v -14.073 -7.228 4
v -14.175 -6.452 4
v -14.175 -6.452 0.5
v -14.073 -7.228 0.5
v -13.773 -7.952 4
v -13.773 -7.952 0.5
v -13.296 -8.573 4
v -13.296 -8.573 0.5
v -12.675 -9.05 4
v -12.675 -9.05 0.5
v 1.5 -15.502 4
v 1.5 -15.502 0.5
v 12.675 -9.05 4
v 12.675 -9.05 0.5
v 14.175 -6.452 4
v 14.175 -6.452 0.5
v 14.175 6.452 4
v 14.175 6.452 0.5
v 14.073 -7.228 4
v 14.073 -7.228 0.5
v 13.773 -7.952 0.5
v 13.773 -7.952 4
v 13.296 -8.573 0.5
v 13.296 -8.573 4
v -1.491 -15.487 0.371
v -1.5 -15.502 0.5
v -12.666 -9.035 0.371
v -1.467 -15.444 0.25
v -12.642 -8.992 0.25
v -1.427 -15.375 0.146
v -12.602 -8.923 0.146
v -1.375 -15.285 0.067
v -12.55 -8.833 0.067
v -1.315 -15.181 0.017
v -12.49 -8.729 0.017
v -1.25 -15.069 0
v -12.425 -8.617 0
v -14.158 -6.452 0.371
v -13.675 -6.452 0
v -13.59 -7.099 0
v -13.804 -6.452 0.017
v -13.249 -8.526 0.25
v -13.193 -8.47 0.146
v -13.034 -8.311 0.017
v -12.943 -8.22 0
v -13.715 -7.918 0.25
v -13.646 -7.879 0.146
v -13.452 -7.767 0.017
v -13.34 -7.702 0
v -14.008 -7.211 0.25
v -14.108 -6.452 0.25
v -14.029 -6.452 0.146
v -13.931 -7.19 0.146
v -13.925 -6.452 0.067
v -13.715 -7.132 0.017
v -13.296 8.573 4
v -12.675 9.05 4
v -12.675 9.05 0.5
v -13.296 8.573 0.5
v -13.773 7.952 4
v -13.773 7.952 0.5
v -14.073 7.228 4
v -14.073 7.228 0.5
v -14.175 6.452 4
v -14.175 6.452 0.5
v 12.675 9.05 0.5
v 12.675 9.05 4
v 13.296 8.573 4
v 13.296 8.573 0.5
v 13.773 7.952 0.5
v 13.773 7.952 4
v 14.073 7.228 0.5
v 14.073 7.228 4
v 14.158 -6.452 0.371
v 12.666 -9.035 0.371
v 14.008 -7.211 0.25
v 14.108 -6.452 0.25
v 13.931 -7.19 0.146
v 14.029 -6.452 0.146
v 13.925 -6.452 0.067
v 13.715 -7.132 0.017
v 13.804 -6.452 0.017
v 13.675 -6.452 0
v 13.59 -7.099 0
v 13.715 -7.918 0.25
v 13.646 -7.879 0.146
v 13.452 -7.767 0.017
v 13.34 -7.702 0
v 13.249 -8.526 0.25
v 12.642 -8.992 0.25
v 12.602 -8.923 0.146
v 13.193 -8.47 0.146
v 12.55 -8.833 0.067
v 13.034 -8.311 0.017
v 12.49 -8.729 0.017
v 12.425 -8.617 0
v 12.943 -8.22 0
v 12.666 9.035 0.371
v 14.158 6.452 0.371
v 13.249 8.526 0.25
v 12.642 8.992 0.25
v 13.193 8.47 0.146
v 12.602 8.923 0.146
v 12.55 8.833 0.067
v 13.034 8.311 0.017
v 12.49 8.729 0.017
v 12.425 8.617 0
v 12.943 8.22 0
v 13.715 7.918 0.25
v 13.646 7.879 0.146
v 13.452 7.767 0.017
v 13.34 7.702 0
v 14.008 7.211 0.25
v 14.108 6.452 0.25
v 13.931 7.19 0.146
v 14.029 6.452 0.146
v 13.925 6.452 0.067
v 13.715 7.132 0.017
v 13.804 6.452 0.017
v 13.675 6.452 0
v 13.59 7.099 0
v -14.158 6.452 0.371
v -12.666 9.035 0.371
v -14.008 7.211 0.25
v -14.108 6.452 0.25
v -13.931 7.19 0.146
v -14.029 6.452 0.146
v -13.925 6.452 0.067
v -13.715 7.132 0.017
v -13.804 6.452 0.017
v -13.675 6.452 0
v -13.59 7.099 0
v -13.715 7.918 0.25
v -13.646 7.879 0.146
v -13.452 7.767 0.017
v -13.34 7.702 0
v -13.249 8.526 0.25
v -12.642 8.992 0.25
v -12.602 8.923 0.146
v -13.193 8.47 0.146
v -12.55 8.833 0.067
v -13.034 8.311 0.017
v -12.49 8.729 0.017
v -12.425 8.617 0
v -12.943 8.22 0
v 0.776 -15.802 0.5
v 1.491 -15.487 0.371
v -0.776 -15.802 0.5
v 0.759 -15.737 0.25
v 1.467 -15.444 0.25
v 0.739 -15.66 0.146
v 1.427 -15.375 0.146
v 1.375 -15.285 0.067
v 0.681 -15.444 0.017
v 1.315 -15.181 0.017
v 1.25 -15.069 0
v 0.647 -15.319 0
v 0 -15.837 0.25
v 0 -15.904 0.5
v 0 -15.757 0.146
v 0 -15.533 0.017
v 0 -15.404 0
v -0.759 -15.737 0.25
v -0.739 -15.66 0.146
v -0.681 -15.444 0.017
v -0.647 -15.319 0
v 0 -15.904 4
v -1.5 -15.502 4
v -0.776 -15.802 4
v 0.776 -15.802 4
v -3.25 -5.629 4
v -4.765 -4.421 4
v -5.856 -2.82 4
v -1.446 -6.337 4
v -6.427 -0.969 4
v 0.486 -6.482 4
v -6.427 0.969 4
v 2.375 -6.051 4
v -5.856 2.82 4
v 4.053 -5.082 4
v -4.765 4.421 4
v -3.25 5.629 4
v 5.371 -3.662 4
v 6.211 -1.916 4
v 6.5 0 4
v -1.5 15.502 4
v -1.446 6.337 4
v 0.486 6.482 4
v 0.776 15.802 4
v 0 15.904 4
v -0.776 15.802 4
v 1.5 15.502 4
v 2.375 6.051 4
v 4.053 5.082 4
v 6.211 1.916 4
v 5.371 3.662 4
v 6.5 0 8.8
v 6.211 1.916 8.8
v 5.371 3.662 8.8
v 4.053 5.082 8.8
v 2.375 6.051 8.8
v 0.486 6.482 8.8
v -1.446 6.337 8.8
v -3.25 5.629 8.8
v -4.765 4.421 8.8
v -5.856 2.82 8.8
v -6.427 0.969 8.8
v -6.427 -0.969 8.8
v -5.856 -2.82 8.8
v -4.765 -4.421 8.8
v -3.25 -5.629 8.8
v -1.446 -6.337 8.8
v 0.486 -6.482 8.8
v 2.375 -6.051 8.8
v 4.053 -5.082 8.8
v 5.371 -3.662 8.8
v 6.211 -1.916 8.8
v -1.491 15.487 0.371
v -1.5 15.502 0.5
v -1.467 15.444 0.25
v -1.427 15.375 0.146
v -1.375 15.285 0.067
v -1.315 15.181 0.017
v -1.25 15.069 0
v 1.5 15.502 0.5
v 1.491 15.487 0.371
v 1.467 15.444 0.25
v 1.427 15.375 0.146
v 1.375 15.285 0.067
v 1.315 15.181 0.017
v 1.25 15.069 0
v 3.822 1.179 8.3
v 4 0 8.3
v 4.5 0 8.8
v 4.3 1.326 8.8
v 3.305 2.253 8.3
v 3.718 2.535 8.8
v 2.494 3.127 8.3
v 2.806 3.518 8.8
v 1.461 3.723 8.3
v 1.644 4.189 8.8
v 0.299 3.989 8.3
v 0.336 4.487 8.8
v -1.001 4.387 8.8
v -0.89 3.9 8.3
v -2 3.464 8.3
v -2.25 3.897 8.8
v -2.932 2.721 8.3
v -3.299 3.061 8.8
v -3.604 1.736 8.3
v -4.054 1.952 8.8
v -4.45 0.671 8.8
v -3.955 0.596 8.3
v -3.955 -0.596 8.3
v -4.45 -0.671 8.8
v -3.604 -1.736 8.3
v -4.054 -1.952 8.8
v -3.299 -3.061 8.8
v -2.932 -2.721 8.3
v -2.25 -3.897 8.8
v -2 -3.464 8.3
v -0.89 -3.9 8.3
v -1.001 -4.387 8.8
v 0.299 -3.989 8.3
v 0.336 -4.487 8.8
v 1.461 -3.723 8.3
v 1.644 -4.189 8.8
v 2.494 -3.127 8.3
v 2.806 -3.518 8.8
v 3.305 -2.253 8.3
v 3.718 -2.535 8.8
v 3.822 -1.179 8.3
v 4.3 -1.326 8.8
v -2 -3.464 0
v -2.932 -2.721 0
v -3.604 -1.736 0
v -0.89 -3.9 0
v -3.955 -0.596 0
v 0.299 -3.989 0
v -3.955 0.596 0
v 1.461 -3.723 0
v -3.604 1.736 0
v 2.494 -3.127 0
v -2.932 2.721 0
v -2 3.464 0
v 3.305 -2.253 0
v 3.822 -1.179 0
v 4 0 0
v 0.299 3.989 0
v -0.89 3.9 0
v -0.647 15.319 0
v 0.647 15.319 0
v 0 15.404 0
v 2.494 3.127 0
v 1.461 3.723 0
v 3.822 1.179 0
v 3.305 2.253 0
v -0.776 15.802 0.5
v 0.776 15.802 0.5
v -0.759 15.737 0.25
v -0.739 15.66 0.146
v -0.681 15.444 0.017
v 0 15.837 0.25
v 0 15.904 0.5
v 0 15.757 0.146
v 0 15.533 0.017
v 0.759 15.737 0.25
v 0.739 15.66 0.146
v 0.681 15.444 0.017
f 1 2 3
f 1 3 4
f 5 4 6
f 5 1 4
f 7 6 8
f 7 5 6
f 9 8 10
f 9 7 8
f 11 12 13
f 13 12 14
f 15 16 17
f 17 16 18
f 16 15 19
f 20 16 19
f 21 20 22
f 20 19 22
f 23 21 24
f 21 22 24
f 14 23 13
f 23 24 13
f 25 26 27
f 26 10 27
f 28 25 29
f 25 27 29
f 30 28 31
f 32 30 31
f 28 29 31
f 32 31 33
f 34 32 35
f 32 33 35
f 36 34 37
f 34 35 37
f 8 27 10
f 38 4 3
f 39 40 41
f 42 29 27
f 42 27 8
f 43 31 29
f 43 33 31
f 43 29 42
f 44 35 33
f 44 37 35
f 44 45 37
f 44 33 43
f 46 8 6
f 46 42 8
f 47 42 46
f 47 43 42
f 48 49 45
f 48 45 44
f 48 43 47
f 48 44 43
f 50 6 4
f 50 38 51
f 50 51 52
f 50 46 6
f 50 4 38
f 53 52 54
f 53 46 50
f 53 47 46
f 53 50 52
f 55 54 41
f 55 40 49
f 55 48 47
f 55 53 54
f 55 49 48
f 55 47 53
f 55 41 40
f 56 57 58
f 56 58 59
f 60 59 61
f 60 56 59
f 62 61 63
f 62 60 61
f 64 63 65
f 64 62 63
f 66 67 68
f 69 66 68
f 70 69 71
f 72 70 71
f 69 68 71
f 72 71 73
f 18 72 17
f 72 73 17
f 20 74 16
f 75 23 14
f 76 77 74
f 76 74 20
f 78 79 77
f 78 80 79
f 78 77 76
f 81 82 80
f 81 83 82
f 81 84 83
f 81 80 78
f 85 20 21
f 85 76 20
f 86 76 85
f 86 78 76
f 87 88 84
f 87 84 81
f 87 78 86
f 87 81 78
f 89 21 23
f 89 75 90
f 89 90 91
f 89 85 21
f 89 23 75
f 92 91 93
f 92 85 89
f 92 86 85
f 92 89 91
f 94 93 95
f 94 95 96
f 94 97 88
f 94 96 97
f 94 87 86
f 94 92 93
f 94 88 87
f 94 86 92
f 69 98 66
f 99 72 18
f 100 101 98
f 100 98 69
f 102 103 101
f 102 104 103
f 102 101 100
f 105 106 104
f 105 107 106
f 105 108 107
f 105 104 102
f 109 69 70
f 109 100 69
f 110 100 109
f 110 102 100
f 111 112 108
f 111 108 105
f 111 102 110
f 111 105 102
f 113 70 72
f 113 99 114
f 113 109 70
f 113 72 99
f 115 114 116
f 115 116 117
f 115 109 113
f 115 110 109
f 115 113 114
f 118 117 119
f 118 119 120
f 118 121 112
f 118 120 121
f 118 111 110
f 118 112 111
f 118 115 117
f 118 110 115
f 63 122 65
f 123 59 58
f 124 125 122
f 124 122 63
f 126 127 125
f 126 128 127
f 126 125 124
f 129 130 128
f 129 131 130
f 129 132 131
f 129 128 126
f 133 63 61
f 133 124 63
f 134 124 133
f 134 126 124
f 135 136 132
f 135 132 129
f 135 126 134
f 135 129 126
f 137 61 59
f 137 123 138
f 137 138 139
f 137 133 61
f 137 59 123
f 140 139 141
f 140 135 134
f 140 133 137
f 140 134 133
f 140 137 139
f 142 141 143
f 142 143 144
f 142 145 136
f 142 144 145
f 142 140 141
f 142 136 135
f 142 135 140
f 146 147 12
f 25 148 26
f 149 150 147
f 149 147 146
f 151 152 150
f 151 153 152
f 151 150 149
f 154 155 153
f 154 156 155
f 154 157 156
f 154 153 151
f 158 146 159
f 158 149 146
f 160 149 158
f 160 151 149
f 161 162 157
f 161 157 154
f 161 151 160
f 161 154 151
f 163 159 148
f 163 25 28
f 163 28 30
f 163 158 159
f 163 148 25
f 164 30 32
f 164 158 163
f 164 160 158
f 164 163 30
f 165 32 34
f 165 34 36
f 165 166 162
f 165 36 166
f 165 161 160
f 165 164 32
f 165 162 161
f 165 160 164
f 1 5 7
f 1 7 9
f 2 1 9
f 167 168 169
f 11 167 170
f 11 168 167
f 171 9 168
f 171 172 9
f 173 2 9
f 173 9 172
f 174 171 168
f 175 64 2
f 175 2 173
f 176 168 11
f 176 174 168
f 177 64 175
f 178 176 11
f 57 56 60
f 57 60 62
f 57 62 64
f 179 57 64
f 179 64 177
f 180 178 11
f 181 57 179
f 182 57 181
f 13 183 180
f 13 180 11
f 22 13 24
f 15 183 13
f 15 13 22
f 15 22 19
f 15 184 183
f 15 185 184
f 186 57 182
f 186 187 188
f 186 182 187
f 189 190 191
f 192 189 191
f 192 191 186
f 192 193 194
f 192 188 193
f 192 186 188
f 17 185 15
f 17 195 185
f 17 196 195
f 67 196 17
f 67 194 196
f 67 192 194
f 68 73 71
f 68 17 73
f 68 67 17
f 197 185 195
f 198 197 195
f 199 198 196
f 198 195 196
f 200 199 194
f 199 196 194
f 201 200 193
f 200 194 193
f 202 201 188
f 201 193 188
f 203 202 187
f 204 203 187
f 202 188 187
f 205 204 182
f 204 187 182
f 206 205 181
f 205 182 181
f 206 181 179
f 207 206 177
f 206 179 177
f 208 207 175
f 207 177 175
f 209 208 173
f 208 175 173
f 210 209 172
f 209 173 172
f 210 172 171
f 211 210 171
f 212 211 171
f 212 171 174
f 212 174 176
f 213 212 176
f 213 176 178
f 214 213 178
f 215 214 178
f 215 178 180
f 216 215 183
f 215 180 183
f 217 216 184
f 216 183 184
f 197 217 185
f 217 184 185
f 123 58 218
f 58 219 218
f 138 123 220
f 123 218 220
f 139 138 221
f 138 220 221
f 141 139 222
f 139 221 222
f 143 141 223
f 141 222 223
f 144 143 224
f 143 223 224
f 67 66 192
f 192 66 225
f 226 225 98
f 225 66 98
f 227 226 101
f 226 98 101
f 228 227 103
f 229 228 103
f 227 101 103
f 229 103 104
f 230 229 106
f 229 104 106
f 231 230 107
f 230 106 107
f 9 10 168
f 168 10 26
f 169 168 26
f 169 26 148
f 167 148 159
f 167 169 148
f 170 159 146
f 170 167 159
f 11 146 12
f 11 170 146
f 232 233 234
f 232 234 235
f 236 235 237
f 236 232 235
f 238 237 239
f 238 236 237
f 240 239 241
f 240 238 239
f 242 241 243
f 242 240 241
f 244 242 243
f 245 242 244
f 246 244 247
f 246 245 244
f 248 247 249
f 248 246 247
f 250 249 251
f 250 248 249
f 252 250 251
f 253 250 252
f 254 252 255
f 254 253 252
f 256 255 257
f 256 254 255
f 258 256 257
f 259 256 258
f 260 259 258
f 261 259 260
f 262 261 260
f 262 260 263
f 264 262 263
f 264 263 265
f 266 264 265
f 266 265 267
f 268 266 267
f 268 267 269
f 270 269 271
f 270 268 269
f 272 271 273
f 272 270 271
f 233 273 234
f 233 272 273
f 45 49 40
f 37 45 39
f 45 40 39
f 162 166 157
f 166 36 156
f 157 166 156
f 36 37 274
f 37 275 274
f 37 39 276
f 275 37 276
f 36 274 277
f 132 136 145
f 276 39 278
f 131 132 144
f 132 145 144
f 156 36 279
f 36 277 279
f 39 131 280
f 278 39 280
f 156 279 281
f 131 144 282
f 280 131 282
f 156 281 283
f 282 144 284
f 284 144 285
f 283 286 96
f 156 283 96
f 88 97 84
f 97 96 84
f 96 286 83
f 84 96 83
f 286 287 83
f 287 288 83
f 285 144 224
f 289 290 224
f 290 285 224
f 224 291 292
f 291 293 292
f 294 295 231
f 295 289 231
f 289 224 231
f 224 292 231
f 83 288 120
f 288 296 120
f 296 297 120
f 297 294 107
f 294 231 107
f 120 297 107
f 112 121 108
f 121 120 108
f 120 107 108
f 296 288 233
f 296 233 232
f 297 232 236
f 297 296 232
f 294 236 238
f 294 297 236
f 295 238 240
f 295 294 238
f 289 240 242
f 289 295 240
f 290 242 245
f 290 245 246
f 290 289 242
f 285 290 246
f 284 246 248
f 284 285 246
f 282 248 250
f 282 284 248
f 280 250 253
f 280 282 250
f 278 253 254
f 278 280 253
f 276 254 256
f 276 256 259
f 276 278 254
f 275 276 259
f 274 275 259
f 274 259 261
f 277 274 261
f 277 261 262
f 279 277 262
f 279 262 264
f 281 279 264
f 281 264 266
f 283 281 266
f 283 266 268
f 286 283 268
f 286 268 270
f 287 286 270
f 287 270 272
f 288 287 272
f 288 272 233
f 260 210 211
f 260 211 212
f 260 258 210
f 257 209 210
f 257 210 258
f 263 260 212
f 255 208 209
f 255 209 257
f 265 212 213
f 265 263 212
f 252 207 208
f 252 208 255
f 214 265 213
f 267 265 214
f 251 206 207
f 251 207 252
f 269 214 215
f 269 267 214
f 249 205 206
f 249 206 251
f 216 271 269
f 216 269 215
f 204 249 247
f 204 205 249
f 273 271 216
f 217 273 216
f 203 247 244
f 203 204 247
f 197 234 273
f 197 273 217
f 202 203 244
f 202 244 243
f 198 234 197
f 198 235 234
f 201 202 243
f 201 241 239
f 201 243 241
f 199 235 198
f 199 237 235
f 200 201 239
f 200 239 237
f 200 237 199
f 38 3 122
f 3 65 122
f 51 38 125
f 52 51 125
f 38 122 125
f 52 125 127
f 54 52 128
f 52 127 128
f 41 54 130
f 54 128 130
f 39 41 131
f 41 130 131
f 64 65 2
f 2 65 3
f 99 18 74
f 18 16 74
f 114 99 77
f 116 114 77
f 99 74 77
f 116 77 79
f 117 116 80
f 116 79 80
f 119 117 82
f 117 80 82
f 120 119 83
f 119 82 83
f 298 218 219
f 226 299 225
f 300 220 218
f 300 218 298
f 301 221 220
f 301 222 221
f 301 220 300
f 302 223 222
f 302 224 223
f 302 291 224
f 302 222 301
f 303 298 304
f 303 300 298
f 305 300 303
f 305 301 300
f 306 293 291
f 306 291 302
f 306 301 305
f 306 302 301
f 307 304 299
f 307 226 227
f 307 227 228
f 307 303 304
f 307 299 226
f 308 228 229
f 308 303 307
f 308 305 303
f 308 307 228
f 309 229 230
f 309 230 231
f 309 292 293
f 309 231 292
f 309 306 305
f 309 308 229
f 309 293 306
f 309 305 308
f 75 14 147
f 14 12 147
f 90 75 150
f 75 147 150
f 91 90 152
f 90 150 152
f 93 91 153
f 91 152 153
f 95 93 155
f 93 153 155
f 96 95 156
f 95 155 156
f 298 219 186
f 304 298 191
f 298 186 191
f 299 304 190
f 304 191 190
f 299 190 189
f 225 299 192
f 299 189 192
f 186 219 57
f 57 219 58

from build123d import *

# Parameters (mm, degrees)
SKETCH_R      = 4
PAD_DEPTH     = 4
SKETCH001_R   = 6.5
SKETCH001_R_2 = 4
PAD001_DEPTH  = 4.8
CHAMFER_SIZE  = 0.5
FILLET_R      = 3
FILLET001_R   = 0.5


with BuildPart() as part:
    # Sketch → Pad (new body)
    with BuildSketch(Plane.XY):
        Polygon((0, 16.36788), (-14.175, 8.18394), (-14.175, -8.18394), (0, -16.36788), (14.175, -8.18394), (14.175, 8.18394), align=None)
        Circle(SKETCH_R, mode=Mode.SUBTRACT)
    extrude(amount=PAD_DEPTH)

    # Sketch001 (on Face9 of Pad) → Pad001 (join)
    with BuildSketch(Plane.XY.offset(4)):
        Circle(SKETCH001_R)
        Circle(SKETCH001_R_2, mode=Mode.SUBTRACT)
    extrude(amount=PAD001_DEPTH)

    # Chamfer
    chamfer_edges = [part.edges().sort_by_distance(p)[0] for p in [
        (-4, 0, 8.8),
    ]]
    chamfer(chamfer_edges, length=CHAMFER_SIZE)

    # Fillet
    fillet_edges = [part.edges().sort_by_distance(p)[0] for p in [
        (0, -16.36788, 2),
        (14.175, -8.18394, 2),
        (14.175, 8.18394, 2),
        (-14.175, -8.18394, 2),
        (-14.175, 8.18394, 2),
        (0, 16.36788, 2),
    ]]
    fillet(fillet_edges, radius=FILLET_R)

    # Fillet001
    fillet001_edges = [part.edges().sort_by_distance(p)[0] for p in [
        (13.773076, -7.951889, 0),
        (7.0875, -12.27591, 0),
        (-7.0875, -12.27591, 0),
        (-13.773076, -7.951889, 0),
        (-14.175, 0, 0),
        (-13.773076, 7.951889, 0),
        (-7.0875, 12.27591, 0),
        (0, 15.903779, 0),
        (7.0875, 12.27591, 0),
        (13.773076, 7.951889, 0),
        (14.175, 0, 0),
        (0, -15.903779, 0),
    ]]
    fillet(fillet001_edges, radius=FILLET001_R)


solid = part.part
